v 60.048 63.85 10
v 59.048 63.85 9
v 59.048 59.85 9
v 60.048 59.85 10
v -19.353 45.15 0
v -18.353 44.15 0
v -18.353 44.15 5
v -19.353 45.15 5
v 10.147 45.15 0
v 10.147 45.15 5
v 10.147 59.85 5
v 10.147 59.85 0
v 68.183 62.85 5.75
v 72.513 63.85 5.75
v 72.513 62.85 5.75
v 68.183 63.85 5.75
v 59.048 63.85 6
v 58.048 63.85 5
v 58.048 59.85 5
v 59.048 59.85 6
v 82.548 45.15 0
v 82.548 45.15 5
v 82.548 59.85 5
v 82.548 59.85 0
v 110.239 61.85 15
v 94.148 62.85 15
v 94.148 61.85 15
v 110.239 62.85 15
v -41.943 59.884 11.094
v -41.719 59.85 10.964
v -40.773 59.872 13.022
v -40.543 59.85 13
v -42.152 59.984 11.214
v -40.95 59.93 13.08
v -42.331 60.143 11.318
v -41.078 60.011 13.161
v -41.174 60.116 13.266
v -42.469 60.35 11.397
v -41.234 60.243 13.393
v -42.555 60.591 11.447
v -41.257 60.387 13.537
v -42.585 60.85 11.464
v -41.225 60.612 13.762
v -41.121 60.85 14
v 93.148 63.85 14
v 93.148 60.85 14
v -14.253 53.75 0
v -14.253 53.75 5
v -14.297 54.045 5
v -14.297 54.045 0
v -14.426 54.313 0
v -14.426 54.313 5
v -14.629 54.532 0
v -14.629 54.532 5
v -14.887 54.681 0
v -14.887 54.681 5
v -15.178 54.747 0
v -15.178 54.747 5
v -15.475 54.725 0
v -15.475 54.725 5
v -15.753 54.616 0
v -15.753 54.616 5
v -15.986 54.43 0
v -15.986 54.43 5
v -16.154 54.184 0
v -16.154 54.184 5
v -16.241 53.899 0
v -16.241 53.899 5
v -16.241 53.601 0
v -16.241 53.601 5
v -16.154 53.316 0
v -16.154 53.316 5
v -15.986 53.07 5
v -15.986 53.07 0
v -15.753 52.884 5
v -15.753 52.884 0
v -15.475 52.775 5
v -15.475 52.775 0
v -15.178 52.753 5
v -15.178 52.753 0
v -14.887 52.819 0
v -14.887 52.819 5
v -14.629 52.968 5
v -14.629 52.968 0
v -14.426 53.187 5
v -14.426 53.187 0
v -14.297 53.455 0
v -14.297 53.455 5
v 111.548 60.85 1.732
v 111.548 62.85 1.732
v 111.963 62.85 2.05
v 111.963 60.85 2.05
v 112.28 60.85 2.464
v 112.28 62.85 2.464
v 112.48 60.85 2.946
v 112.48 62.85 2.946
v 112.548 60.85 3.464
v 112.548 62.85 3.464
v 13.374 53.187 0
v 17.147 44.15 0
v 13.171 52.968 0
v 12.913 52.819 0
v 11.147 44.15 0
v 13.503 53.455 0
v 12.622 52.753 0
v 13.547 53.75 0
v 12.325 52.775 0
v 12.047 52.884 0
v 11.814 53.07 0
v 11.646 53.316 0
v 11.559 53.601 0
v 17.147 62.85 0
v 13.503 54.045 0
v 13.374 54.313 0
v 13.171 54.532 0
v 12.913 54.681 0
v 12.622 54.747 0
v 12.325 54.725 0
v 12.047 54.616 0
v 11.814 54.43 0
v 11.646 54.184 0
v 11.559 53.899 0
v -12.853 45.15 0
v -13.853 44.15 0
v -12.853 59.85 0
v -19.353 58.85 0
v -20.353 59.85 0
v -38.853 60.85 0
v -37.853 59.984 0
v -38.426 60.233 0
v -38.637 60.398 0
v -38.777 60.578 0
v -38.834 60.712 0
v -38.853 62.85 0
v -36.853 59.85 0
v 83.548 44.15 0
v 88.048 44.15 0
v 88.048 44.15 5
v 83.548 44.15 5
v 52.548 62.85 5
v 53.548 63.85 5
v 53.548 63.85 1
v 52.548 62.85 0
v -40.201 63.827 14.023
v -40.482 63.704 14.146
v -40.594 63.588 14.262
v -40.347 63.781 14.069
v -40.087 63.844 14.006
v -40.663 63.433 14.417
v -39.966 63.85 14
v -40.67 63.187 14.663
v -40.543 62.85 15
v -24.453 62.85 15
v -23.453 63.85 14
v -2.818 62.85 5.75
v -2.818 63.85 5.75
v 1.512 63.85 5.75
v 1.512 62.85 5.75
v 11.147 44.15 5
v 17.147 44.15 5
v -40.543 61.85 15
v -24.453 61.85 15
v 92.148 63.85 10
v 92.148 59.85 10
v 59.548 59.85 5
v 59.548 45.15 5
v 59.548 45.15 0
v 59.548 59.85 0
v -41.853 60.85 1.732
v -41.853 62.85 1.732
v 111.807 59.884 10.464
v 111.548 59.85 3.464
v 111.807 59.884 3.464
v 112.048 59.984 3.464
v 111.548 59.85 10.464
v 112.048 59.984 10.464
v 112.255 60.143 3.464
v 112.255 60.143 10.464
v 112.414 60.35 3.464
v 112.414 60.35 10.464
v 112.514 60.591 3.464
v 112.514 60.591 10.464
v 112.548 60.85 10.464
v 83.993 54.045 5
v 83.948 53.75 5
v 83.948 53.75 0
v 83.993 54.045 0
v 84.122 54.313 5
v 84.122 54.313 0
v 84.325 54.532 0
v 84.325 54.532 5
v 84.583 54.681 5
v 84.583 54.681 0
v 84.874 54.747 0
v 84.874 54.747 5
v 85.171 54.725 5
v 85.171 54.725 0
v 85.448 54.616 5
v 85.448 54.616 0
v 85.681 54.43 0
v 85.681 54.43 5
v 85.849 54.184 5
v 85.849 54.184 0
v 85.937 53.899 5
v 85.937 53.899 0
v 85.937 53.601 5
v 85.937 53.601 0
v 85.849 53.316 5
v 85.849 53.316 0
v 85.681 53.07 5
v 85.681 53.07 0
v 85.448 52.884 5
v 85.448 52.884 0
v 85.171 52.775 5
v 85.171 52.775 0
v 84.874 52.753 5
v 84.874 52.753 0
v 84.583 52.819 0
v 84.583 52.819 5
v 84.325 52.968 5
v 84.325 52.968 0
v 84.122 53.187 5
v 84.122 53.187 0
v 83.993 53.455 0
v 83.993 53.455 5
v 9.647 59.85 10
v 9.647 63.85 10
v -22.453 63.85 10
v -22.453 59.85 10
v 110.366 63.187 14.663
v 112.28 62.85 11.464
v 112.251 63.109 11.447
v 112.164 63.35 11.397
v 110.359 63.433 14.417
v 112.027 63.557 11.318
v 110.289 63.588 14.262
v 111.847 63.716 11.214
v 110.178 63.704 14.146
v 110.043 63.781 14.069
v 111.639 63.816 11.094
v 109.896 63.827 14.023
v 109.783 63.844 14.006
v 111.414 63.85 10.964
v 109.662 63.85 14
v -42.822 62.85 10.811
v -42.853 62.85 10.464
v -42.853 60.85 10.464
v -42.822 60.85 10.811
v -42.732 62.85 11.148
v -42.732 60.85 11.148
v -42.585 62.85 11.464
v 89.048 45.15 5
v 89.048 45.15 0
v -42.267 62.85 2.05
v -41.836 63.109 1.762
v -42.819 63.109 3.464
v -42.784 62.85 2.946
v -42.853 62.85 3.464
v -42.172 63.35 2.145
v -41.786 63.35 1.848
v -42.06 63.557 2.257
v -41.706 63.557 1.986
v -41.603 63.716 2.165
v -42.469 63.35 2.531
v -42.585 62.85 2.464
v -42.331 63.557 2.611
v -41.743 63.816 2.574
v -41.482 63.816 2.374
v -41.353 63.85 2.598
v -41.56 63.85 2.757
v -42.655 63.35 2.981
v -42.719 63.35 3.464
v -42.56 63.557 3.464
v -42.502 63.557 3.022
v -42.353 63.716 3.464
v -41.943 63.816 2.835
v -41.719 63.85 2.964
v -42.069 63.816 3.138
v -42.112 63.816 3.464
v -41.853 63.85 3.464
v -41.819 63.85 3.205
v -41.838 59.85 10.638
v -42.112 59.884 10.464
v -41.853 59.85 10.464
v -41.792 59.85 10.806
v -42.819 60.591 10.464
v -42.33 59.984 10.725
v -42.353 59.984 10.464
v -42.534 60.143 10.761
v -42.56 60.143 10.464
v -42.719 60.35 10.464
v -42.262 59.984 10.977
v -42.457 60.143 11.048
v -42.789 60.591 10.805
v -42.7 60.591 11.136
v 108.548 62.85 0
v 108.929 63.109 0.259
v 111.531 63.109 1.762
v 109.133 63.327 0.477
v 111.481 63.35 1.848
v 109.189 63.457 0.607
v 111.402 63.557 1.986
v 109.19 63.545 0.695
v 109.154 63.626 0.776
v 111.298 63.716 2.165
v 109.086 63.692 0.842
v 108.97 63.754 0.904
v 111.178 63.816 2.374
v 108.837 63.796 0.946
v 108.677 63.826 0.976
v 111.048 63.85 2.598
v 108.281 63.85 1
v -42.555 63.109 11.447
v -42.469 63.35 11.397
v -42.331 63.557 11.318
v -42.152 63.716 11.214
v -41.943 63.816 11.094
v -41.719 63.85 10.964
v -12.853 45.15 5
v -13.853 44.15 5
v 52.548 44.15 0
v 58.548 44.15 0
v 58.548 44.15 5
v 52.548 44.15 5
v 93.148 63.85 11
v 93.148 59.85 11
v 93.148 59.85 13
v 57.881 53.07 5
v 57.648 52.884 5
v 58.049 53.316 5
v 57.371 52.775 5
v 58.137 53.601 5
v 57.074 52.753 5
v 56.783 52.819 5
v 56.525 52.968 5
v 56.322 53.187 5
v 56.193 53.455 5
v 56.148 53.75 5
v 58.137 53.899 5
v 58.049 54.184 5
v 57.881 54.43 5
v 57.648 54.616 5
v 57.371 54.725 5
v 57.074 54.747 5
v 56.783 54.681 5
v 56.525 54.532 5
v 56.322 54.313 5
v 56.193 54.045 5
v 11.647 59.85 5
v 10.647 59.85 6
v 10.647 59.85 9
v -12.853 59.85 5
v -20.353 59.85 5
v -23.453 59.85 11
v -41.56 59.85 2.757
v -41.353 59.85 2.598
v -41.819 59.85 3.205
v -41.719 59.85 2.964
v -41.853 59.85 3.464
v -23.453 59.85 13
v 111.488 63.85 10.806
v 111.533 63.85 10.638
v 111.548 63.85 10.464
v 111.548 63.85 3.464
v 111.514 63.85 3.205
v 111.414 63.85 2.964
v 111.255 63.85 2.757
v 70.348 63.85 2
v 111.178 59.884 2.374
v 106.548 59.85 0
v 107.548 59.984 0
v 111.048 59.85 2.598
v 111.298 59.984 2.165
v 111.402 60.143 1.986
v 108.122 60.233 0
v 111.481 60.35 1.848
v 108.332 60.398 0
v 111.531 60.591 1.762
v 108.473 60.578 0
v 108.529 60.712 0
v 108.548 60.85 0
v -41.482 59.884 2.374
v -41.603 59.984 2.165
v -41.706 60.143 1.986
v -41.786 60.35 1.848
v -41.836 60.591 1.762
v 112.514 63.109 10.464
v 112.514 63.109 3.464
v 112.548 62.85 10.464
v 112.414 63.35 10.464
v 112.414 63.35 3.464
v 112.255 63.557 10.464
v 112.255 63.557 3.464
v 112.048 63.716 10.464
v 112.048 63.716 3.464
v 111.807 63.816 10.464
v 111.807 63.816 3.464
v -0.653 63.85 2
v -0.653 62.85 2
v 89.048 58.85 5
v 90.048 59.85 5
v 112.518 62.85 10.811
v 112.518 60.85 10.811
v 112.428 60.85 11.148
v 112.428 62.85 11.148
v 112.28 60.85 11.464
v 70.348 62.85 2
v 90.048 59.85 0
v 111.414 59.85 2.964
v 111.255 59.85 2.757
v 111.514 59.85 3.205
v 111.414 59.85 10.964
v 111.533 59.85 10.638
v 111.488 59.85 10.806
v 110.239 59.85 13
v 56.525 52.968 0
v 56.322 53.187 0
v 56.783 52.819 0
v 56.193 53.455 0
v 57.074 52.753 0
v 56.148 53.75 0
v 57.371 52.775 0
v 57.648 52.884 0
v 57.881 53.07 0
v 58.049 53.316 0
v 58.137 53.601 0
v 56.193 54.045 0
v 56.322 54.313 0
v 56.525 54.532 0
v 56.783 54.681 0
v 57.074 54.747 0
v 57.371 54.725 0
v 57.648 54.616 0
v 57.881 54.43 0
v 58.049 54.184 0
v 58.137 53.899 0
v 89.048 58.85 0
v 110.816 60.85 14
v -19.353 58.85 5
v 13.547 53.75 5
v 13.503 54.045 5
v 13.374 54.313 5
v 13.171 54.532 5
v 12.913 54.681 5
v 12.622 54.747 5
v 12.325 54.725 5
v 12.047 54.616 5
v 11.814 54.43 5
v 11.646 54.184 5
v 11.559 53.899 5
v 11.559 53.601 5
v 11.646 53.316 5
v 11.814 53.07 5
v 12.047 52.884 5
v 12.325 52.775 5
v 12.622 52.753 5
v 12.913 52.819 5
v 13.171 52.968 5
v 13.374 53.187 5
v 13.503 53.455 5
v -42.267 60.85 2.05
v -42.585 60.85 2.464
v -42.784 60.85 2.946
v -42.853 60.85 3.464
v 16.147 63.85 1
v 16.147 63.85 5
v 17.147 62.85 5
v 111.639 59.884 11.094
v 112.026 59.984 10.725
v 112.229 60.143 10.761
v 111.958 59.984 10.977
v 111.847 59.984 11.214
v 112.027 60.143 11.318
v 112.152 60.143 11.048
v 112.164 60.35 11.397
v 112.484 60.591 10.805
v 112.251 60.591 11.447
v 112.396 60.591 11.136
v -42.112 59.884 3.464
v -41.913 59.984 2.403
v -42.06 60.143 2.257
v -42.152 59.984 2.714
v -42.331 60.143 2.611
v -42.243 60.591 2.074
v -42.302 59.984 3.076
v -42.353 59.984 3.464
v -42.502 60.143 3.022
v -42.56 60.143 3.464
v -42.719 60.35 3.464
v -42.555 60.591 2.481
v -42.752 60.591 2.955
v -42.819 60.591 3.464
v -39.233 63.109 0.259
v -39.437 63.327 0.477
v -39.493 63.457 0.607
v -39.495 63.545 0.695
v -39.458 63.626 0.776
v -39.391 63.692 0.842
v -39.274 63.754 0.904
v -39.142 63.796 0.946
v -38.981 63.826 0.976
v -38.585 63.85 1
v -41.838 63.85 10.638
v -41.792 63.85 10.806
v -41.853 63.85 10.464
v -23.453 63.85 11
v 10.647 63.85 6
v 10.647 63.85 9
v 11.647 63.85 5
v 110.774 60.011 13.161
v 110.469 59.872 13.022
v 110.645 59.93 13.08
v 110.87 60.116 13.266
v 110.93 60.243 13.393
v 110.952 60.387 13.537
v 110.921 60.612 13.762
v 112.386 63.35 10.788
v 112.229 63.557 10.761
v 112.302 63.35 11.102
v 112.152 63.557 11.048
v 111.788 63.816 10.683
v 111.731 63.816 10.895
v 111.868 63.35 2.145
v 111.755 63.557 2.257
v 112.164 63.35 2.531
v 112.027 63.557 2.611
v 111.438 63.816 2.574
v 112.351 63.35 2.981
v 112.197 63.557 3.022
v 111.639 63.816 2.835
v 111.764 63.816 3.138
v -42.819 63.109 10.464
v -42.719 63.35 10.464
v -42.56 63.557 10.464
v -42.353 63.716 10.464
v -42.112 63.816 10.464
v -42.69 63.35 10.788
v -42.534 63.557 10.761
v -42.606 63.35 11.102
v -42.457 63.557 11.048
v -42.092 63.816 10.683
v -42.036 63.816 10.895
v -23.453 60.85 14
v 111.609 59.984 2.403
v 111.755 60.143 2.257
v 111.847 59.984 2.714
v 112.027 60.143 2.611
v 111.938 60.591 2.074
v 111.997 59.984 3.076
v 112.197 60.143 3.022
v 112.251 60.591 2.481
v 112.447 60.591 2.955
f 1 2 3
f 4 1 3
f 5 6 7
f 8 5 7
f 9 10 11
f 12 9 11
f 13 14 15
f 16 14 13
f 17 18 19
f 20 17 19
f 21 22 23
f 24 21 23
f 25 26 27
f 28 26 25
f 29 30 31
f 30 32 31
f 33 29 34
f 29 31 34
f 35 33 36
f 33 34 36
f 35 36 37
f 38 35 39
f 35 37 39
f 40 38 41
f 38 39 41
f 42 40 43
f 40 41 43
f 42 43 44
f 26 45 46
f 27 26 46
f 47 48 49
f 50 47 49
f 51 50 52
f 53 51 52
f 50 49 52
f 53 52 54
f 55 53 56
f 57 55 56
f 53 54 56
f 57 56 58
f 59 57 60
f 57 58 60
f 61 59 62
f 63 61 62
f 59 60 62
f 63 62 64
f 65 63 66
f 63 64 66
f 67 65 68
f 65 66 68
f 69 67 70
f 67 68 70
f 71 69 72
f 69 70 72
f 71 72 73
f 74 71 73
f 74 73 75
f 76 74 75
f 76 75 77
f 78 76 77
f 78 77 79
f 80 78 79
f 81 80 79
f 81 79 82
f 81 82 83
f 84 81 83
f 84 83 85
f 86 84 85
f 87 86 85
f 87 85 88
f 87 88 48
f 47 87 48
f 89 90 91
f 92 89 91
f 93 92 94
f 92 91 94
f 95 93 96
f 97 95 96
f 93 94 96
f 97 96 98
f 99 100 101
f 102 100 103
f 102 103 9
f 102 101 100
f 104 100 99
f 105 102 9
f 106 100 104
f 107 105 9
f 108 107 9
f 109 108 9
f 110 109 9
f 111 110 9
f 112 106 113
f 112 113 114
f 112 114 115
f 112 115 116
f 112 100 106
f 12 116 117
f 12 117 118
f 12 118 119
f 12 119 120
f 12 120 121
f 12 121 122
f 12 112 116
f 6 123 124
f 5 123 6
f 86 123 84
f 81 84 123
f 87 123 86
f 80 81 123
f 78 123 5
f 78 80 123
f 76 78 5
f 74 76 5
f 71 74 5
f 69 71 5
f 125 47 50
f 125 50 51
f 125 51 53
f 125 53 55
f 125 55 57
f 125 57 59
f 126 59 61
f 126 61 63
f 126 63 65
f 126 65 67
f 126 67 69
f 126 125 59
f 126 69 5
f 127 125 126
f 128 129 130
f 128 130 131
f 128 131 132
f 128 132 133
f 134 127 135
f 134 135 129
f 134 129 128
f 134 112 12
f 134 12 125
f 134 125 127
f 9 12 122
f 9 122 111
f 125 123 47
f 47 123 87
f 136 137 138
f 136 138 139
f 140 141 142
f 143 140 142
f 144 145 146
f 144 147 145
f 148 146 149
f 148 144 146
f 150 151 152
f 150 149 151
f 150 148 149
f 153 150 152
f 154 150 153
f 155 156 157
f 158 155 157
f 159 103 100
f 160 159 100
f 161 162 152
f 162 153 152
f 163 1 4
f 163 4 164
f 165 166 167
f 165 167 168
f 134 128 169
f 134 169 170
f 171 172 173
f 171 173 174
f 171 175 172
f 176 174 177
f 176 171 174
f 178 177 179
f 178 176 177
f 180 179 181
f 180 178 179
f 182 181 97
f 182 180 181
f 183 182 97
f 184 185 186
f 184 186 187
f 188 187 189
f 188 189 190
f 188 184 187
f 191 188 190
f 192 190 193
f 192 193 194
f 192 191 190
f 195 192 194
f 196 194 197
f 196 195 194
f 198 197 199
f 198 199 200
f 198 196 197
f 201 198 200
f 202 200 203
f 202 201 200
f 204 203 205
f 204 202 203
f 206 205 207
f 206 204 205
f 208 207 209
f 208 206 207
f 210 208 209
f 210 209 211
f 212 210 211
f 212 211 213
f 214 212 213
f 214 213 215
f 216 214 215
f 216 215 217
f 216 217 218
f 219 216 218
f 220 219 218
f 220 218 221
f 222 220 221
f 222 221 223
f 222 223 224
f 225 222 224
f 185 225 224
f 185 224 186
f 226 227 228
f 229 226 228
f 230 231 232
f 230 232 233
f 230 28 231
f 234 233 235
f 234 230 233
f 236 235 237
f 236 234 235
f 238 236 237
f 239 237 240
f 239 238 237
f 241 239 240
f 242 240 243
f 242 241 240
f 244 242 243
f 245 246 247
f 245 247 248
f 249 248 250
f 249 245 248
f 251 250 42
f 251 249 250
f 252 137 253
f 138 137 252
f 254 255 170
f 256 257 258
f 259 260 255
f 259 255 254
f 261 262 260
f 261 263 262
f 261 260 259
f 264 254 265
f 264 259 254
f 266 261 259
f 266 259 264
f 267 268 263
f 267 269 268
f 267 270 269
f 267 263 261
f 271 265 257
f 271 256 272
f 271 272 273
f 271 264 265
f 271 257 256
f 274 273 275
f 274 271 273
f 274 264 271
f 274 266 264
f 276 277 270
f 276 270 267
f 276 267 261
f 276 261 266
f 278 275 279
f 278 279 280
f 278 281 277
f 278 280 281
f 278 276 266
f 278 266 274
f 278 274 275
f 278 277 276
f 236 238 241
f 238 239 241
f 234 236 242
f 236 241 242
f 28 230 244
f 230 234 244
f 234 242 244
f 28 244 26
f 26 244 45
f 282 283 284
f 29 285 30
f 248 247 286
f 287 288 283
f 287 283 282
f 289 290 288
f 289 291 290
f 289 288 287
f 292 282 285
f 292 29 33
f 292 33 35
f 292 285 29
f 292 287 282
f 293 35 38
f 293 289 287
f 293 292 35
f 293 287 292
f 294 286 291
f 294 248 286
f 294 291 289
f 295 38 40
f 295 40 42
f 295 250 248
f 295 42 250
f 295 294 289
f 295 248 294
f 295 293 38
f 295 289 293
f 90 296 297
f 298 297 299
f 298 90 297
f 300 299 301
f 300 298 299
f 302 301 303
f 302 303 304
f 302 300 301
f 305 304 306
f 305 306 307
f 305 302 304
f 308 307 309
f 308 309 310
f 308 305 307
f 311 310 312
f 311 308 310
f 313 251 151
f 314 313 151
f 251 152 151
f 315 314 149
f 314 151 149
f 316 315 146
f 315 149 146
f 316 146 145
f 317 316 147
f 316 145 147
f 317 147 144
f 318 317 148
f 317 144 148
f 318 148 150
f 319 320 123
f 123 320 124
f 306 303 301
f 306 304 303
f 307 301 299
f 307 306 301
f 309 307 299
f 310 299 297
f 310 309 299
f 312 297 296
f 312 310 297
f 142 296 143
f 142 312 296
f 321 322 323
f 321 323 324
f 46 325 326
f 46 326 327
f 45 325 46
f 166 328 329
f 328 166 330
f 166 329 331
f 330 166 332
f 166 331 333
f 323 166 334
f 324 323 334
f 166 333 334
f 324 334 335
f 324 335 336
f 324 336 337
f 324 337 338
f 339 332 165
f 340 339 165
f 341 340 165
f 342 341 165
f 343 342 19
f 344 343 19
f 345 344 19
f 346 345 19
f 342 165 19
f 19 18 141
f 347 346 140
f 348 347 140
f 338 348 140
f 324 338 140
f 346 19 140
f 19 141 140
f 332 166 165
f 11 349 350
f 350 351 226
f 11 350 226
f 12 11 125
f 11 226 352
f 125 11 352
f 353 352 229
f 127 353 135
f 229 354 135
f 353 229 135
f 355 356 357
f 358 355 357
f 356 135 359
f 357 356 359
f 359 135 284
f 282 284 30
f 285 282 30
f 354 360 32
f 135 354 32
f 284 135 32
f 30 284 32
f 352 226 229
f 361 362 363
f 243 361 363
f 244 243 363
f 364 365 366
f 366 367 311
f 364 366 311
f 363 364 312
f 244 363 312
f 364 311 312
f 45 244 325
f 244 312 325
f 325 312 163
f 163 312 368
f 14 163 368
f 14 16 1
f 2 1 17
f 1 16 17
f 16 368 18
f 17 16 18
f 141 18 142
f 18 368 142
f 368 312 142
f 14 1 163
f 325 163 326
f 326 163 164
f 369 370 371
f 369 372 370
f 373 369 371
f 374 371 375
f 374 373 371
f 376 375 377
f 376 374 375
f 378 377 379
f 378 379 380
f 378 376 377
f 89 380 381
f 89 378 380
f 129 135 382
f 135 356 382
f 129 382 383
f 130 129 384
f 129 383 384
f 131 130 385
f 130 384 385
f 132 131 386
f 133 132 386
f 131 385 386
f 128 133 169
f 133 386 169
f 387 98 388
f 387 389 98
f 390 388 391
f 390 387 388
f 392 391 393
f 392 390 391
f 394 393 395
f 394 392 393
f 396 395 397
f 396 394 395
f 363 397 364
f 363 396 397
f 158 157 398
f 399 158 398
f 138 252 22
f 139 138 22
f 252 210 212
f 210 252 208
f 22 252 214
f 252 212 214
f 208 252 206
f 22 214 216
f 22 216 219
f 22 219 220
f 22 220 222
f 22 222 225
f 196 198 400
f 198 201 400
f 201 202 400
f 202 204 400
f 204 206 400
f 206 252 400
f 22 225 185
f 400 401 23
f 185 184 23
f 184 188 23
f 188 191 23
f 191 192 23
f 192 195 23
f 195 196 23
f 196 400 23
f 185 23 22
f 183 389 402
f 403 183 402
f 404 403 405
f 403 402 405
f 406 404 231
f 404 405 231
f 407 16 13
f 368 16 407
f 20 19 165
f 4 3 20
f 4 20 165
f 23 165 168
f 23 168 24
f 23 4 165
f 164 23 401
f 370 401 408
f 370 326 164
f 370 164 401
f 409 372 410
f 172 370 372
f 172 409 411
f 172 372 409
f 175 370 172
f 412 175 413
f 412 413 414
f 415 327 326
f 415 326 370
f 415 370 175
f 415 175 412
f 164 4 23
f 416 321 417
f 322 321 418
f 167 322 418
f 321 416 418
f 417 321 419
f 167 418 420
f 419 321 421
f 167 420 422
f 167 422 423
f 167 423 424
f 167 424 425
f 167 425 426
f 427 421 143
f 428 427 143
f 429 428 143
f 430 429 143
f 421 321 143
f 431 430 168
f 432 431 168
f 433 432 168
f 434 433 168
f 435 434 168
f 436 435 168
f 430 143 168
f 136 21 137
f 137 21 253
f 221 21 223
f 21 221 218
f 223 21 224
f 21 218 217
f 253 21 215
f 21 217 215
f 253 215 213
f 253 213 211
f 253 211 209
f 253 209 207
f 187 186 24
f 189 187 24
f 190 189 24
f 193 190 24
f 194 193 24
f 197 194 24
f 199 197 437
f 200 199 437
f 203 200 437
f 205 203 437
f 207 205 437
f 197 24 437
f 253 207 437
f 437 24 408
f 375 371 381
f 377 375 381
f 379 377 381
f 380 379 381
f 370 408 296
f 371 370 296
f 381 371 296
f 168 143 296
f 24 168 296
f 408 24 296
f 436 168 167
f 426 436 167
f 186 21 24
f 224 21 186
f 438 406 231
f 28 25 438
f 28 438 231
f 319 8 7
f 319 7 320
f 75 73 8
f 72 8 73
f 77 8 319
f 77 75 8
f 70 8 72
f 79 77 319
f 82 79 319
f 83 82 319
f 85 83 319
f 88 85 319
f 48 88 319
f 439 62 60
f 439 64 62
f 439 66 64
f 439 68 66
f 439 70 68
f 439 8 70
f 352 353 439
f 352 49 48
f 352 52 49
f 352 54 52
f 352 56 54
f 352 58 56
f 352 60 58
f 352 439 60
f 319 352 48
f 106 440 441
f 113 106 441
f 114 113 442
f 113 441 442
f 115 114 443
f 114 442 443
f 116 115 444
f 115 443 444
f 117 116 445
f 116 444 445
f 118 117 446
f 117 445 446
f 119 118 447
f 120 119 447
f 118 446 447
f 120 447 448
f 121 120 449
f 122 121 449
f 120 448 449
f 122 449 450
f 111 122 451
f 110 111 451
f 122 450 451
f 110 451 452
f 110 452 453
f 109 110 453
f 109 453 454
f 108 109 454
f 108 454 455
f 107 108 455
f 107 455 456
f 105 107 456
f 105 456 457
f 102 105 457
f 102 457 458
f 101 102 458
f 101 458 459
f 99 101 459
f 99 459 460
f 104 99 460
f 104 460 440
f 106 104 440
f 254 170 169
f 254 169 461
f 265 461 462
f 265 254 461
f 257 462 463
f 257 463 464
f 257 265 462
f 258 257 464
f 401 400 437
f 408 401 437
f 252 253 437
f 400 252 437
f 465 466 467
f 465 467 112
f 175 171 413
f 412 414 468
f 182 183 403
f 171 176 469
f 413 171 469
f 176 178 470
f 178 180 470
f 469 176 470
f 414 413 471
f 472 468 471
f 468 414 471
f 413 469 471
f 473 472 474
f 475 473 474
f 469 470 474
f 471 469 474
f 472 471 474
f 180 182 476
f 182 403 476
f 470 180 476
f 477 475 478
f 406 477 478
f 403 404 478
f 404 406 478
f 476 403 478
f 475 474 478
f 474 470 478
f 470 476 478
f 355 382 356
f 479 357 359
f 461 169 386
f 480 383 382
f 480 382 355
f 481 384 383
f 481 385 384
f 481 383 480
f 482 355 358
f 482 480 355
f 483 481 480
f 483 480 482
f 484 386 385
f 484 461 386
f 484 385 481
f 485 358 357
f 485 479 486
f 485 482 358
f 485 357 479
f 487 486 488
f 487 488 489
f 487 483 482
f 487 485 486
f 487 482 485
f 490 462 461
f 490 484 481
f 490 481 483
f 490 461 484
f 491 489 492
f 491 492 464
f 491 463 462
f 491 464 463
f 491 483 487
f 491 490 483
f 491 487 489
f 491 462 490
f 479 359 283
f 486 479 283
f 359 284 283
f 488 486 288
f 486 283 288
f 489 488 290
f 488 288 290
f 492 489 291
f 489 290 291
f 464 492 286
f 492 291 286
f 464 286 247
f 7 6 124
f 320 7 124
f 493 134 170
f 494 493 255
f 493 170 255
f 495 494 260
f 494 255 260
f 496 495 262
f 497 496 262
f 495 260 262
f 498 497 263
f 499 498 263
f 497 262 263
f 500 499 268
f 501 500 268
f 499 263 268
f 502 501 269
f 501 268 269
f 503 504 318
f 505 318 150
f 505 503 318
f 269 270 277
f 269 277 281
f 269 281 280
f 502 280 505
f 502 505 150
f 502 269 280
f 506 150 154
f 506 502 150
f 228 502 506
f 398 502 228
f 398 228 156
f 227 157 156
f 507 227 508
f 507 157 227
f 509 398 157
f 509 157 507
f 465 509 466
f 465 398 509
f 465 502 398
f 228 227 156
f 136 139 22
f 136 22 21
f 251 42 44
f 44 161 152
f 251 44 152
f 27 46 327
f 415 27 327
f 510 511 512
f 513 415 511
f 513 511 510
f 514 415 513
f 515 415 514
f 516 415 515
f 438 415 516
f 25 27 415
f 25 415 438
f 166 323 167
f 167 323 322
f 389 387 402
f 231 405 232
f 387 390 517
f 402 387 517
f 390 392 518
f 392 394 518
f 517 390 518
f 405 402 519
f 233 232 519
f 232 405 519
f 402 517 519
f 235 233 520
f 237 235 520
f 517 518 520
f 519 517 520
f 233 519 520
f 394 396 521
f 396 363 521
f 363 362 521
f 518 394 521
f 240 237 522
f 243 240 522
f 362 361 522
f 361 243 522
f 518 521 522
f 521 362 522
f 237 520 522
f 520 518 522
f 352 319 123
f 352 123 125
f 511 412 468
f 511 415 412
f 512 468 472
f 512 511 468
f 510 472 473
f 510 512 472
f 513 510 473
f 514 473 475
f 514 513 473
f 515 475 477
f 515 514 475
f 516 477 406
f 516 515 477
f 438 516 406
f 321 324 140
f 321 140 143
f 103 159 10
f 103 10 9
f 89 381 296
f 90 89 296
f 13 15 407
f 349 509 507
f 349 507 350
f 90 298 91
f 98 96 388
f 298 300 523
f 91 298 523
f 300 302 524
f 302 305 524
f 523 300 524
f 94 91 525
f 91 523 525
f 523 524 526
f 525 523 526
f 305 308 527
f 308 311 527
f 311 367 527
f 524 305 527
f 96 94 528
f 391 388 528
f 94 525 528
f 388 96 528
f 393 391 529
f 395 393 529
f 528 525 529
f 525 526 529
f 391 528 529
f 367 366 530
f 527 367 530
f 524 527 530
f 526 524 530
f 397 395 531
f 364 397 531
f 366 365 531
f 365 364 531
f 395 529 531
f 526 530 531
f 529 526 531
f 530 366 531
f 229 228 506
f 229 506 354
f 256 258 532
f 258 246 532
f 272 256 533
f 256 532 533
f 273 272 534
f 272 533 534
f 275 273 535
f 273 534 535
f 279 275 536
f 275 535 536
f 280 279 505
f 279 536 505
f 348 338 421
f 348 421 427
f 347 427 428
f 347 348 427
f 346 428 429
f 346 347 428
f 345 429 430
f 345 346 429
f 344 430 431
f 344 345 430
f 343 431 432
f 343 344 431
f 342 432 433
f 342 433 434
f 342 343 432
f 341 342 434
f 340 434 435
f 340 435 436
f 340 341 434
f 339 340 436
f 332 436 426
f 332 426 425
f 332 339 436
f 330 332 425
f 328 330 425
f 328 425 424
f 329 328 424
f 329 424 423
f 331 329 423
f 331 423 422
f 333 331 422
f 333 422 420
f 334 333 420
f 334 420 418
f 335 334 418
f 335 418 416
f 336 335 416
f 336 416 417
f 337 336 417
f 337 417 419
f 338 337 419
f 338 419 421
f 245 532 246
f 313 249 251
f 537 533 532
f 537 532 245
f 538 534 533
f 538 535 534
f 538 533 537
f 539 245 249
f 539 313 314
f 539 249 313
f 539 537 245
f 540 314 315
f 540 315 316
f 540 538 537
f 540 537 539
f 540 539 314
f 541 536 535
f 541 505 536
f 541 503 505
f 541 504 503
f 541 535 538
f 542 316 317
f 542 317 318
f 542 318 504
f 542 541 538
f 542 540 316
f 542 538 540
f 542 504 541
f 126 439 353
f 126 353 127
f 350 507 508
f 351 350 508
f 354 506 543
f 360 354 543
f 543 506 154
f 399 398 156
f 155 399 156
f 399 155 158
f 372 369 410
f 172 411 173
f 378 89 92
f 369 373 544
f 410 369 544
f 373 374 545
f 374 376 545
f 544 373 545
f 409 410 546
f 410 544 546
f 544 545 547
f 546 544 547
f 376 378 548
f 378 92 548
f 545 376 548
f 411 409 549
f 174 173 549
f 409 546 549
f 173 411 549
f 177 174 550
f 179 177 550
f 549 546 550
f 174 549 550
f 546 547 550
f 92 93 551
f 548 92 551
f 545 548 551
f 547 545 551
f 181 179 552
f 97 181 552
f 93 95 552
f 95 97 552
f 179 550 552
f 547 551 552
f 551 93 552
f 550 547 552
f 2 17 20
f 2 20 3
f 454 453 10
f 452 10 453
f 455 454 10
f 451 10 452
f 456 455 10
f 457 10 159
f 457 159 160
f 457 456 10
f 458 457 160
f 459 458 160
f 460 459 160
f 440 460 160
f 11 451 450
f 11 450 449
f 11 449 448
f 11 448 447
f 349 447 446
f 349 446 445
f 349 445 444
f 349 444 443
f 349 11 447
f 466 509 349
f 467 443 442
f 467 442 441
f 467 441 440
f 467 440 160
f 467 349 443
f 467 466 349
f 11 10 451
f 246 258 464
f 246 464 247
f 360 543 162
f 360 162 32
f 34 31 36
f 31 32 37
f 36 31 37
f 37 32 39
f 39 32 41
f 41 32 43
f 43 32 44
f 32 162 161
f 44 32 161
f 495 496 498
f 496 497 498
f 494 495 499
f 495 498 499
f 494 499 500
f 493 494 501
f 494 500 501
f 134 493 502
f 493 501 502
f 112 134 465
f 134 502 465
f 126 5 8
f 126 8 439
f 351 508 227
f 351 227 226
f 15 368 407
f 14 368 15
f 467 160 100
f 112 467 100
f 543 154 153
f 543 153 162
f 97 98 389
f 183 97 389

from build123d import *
from OCP.BRepFilletAPI import BRepFilletAPI_MakeChamfer

# Parameters (mm, degrees)
SKETCH1_W           = 36.5
SKETCH1_H           = 19.2
BOSS_EXTRUDE1_DEPTH = 5
SKETCH2_R           = 1
SKETCH2_W           = 23
SKETCH2_H           = 15.7
CUT_EXTRUDE3_DEPTH  = 67.428509309
SKETCH4_W           = 60
SKETCH4_H           = 15
BOSS_EXTRUDE2_DEPTH = 0.5
BOSS_EXTRUDE3_DEPTH = 3.5
CHAMFER1_SIZE       = 2
CHAMFER2_SIZE       = 1
CHAMFER3_SIZE       = 4
CHAMFER3_SIZE2      = 2.309401077
FILLET1_R           = 2
CUT_EXTRUDE4_DEPTH  = 1
FILLET2_R           = 1
CUT_EXTRUDE5_DEPTH  = 10
CHAMFER4_SIZE       = 1


with BuildPart() as part:
    # Sketch1 → Boss-Extrude1 (new body)
    with BuildSketch(Plane.XY):
        with Locations((-1.102631579, 53.75)):
            Rectangle(SKETCH1_W, SKETCH1_H)
    extrude(amount=BOSS_EXTRUDE1_DEPTH)

    # Sketch2 → Cut-Extrude3 (cut, through all)
    with BuildSketch(Plane.XY.offset(5)):
        with Locations((-15.252631579, 53.75)):
            Circle(SKETCH2_R)
        with Locations((12.547368421, 53.75)):
            Circle(SKETCH2_R)
        with Locations((-1.352631579, 52)):
            Rectangle(SKETCH2_W, SKETCH2_H)
    extrude(amount=-CUT_EXTRUDE3_DEPTH, mode=Mode.SUBTRACT)

    # Sketch4 → Boss-Extrude2 (add)
    with BuildSketch(Plane(origin=(0, 63.35, 0), x_dir=(1, 0, 0), z_dir=(0, 1, 0))):
        with Locations((-12.852631579, -7.5)):
            Rectangle(SKETCH4_W, SKETCH4_H)
    extrude(amount=BOSS_EXTRUDE2_DEPTH)

    # Sketch7 → Boss-Extrude3 (add)
    with BuildSketch(Plane.XZ.offset(-63.35)):
        Polygon((-19.352631579, 0), (-42.852631579, 0), (-42.852631579, 15), (-19.052631579, 15), (17.147368421, 15), (17.147368421, 5), (-19.352631579, 5), align=None)
    extrude(amount=BOSS_EXTRUDE3_DEPTH)

    # Chamfer1
    chamfer1_edges = [part.edges().sort_by_distance(p)[0] for p in [
        (-12.852631579, 59.85, 15),
    ]]
    chamfer(chamfer1_edges, length=CHAMFER1_SIZE)

    # Chamfer2
    chamfer2_edges = [part.edges().sort_by_distance(p)[0] for p in [
        (-12.852631579, 44.15, 2.5),
        (10.147368421, 44.15, 2.5),
        (17.147368421, 63.85, 7.5),
        (-12.852631579, 63.85, 0),
        (-12.852631579, 63.85, 15),
        (-19.352631579, 59.85, 2.5),
        (-19.352631579, 44.15, 2.5),
    ]]
    chamfer(chamfer2_edges, length=CHAMFER2_SIZE)

    # Chamfer3: one chamfer whose edges measure the first distance from different faces: ONE call of the kernel's chamfer builder (chamfer() names one face for all edges)
    chamfer3_edges_1 = [part.edges().sort_by_distance(p)[0] for p in [
        (-42.852631579, 61.35, 0),
    ]]
    chamfer3_side_1 = [part.faces().sort_by_distance(p)[0] for p in [
        (-18.724165987, 52, 0),
    ]]
    chamfer3_edges_2 = [part.edges().sort_by_distance(p)[0] for p in [
        (-42.852631579, 62.35, 15),
    ]]
    chamfer3_side_2 = [part.faces().sort_by_distance(p)[0] for p in [
        (-42.852631579, 61.86754386, 7.260233918),
    ]]
    chamfer3 = BRepFilletAPI_MakeChamfer(part.part.solid().wrapped)
    for e in chamfer3_edges_1:
        chamfer3.Add(CHAMFER3_SIZE, CHAMFER3_SIZE2, e.wrapped, chamfer3_side_1[0].wrapped)  # the first distance lies on this face
    for e in chamfer3_edges_2:
        chamfer3.Add(CHAMFER3_SIZE, CHAMFER3_SIZE2, e.wrapped, chamfer3_side_2[0].wrapped)  # the first distance lies on this face
    add(Compound.cast(chamfer3.Shape()), mode=Mode.REPLACE)

    # Fillet1
    fillet1_edges = [part.edges().sort_by_distance(p)[0] for p in [
        (-42.852631579, 61.85, 11),
        (-42.852631579, 61.85, 2.309401077),
    ]]
    fillet(fillet1_edges, radius=FILLET1_R)

    # Sketch8 → Cut-Extrude4 (cut)
    with BuildSketch(Plane(origin=(0, 63.85, 0), x_dir=(1, 0, 0), z_dir=(0, 1, 0))):
        Polygon((-0.652631579, -2), (-2.817695088, -5.75), (1.512431931, -5.75), align=None)
    extrude(amount=-CUT_EXTRUDE4_DEPTH, mode=Mode.SUBTRACT)

    # Fillet2
    fillet2_edges = [part.edges().sort_by_distance(p)[0] for p in [
        (-41.218656983, 63.85, 1.366025404),
        (-42.584682387, 63.85, 2.464101615),
        (-41.852631579, 63.85, 12.732050808),
        (-42.784483232, 63.85, 10.981739705),
        (-40.352631579, 59.85, 0.866025404),
        (-42.584682387, 59.85, 2.464101615),
        (-42.141306714, 59.85, 12.232050808),
        (-42.784483232, 59.85, 10.981739705),
        (-42.852631579, 63.85, 6.964101615),
        (-42.852631579, 59.85, 6.964101615),
    ]]
    fillet(fillet2_edges, radius=FILLET2_R - 0.0001)  # a hair under: the kernel refuses the full size

    # Sketch9 → Cut-Extrude5 (cut)
    with BuildSketch(Plane(origin=(0, 63.85, 0), x_dir=(1, 0, 0), z_dir=(0, 1, 0))):
        Polygon((17.147368421, -5), (10.647368421, -5), (10.647368421, -10), (-23.452631579, -10), (-23.452631579, -15), (9.647368421, -15), (17.147368421, -15), align=None)
    extrude(amount=-CUT_EXTRUDE5_DEPTH, mode=Mode.SUBTRACT)

    # Chamfer4
    chamfer4_edges = [part.edges().sort_by_distance(p)[0] for p in [
        (10.647368421, 61.85, 5),
        (-23.452631579, 61.85, 10),
        (10.647368421, 61.85, 10),
        (-23.452631579, 62.35, 15),
    ]]
    chamfer(chamfer4_edges, length=CHAMFER4_SIZE)


with BuildPart() as body_2:
    # Mirror1: mirrored copy
    add(part.part.mirror(Plane.ZY.offset(-34.84782876)))


solid = Compound([part.part, body_2.part])
